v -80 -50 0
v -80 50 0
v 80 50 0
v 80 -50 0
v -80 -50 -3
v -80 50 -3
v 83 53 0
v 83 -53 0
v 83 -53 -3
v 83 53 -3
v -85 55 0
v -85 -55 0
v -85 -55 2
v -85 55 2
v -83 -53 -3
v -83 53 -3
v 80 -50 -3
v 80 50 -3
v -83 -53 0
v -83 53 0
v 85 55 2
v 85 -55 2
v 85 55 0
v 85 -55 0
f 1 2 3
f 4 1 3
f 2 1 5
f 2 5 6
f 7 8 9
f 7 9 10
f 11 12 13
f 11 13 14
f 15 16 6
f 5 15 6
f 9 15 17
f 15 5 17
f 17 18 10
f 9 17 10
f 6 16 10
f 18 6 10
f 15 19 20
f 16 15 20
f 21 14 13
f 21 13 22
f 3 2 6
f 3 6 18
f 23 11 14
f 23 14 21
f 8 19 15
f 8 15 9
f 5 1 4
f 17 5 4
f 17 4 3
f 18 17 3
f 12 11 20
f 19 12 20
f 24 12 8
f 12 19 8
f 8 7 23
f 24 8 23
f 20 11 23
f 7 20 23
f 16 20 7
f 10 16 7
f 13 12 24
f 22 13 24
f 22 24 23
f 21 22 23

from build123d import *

# Parameters (mm, degrees)
SKETCH1_W           = 170
SKETCH1_H           = 110
BOSS_EXTRUDE1_DEPTH = 2
SKETCH2_W           = 166
SKETCH2_H           = 106
SKETCH2_W_2         = 160
SKETCH2_H_2         = 100
BOSS_EXTRUDE3_DEPTH = 5


with BuildPart() as part:
    # Sketch1 → Boss-Extrude1 (new body)
    with BuildSketch(Plane.XY):
        Rectangle(SKETCH1_W, SKETCH1_H)
    extrude(amount=BOSS_EXTRUDE1_DEPTH)

    # Sketch2 → Boss-Extrude3 (add)
    with BuildSketch(Plane.XY.offset(2)):
        Rectangle(SKETCH2_W, SKETCH2_H)
        Rectangle(SKETCH2_W_2, SKETCH2_H_2, mode=Mode.SUBTRACT)
    extrude(amount=-BOSS_EXTRUDE3_DEPTH)


solid = part.part
